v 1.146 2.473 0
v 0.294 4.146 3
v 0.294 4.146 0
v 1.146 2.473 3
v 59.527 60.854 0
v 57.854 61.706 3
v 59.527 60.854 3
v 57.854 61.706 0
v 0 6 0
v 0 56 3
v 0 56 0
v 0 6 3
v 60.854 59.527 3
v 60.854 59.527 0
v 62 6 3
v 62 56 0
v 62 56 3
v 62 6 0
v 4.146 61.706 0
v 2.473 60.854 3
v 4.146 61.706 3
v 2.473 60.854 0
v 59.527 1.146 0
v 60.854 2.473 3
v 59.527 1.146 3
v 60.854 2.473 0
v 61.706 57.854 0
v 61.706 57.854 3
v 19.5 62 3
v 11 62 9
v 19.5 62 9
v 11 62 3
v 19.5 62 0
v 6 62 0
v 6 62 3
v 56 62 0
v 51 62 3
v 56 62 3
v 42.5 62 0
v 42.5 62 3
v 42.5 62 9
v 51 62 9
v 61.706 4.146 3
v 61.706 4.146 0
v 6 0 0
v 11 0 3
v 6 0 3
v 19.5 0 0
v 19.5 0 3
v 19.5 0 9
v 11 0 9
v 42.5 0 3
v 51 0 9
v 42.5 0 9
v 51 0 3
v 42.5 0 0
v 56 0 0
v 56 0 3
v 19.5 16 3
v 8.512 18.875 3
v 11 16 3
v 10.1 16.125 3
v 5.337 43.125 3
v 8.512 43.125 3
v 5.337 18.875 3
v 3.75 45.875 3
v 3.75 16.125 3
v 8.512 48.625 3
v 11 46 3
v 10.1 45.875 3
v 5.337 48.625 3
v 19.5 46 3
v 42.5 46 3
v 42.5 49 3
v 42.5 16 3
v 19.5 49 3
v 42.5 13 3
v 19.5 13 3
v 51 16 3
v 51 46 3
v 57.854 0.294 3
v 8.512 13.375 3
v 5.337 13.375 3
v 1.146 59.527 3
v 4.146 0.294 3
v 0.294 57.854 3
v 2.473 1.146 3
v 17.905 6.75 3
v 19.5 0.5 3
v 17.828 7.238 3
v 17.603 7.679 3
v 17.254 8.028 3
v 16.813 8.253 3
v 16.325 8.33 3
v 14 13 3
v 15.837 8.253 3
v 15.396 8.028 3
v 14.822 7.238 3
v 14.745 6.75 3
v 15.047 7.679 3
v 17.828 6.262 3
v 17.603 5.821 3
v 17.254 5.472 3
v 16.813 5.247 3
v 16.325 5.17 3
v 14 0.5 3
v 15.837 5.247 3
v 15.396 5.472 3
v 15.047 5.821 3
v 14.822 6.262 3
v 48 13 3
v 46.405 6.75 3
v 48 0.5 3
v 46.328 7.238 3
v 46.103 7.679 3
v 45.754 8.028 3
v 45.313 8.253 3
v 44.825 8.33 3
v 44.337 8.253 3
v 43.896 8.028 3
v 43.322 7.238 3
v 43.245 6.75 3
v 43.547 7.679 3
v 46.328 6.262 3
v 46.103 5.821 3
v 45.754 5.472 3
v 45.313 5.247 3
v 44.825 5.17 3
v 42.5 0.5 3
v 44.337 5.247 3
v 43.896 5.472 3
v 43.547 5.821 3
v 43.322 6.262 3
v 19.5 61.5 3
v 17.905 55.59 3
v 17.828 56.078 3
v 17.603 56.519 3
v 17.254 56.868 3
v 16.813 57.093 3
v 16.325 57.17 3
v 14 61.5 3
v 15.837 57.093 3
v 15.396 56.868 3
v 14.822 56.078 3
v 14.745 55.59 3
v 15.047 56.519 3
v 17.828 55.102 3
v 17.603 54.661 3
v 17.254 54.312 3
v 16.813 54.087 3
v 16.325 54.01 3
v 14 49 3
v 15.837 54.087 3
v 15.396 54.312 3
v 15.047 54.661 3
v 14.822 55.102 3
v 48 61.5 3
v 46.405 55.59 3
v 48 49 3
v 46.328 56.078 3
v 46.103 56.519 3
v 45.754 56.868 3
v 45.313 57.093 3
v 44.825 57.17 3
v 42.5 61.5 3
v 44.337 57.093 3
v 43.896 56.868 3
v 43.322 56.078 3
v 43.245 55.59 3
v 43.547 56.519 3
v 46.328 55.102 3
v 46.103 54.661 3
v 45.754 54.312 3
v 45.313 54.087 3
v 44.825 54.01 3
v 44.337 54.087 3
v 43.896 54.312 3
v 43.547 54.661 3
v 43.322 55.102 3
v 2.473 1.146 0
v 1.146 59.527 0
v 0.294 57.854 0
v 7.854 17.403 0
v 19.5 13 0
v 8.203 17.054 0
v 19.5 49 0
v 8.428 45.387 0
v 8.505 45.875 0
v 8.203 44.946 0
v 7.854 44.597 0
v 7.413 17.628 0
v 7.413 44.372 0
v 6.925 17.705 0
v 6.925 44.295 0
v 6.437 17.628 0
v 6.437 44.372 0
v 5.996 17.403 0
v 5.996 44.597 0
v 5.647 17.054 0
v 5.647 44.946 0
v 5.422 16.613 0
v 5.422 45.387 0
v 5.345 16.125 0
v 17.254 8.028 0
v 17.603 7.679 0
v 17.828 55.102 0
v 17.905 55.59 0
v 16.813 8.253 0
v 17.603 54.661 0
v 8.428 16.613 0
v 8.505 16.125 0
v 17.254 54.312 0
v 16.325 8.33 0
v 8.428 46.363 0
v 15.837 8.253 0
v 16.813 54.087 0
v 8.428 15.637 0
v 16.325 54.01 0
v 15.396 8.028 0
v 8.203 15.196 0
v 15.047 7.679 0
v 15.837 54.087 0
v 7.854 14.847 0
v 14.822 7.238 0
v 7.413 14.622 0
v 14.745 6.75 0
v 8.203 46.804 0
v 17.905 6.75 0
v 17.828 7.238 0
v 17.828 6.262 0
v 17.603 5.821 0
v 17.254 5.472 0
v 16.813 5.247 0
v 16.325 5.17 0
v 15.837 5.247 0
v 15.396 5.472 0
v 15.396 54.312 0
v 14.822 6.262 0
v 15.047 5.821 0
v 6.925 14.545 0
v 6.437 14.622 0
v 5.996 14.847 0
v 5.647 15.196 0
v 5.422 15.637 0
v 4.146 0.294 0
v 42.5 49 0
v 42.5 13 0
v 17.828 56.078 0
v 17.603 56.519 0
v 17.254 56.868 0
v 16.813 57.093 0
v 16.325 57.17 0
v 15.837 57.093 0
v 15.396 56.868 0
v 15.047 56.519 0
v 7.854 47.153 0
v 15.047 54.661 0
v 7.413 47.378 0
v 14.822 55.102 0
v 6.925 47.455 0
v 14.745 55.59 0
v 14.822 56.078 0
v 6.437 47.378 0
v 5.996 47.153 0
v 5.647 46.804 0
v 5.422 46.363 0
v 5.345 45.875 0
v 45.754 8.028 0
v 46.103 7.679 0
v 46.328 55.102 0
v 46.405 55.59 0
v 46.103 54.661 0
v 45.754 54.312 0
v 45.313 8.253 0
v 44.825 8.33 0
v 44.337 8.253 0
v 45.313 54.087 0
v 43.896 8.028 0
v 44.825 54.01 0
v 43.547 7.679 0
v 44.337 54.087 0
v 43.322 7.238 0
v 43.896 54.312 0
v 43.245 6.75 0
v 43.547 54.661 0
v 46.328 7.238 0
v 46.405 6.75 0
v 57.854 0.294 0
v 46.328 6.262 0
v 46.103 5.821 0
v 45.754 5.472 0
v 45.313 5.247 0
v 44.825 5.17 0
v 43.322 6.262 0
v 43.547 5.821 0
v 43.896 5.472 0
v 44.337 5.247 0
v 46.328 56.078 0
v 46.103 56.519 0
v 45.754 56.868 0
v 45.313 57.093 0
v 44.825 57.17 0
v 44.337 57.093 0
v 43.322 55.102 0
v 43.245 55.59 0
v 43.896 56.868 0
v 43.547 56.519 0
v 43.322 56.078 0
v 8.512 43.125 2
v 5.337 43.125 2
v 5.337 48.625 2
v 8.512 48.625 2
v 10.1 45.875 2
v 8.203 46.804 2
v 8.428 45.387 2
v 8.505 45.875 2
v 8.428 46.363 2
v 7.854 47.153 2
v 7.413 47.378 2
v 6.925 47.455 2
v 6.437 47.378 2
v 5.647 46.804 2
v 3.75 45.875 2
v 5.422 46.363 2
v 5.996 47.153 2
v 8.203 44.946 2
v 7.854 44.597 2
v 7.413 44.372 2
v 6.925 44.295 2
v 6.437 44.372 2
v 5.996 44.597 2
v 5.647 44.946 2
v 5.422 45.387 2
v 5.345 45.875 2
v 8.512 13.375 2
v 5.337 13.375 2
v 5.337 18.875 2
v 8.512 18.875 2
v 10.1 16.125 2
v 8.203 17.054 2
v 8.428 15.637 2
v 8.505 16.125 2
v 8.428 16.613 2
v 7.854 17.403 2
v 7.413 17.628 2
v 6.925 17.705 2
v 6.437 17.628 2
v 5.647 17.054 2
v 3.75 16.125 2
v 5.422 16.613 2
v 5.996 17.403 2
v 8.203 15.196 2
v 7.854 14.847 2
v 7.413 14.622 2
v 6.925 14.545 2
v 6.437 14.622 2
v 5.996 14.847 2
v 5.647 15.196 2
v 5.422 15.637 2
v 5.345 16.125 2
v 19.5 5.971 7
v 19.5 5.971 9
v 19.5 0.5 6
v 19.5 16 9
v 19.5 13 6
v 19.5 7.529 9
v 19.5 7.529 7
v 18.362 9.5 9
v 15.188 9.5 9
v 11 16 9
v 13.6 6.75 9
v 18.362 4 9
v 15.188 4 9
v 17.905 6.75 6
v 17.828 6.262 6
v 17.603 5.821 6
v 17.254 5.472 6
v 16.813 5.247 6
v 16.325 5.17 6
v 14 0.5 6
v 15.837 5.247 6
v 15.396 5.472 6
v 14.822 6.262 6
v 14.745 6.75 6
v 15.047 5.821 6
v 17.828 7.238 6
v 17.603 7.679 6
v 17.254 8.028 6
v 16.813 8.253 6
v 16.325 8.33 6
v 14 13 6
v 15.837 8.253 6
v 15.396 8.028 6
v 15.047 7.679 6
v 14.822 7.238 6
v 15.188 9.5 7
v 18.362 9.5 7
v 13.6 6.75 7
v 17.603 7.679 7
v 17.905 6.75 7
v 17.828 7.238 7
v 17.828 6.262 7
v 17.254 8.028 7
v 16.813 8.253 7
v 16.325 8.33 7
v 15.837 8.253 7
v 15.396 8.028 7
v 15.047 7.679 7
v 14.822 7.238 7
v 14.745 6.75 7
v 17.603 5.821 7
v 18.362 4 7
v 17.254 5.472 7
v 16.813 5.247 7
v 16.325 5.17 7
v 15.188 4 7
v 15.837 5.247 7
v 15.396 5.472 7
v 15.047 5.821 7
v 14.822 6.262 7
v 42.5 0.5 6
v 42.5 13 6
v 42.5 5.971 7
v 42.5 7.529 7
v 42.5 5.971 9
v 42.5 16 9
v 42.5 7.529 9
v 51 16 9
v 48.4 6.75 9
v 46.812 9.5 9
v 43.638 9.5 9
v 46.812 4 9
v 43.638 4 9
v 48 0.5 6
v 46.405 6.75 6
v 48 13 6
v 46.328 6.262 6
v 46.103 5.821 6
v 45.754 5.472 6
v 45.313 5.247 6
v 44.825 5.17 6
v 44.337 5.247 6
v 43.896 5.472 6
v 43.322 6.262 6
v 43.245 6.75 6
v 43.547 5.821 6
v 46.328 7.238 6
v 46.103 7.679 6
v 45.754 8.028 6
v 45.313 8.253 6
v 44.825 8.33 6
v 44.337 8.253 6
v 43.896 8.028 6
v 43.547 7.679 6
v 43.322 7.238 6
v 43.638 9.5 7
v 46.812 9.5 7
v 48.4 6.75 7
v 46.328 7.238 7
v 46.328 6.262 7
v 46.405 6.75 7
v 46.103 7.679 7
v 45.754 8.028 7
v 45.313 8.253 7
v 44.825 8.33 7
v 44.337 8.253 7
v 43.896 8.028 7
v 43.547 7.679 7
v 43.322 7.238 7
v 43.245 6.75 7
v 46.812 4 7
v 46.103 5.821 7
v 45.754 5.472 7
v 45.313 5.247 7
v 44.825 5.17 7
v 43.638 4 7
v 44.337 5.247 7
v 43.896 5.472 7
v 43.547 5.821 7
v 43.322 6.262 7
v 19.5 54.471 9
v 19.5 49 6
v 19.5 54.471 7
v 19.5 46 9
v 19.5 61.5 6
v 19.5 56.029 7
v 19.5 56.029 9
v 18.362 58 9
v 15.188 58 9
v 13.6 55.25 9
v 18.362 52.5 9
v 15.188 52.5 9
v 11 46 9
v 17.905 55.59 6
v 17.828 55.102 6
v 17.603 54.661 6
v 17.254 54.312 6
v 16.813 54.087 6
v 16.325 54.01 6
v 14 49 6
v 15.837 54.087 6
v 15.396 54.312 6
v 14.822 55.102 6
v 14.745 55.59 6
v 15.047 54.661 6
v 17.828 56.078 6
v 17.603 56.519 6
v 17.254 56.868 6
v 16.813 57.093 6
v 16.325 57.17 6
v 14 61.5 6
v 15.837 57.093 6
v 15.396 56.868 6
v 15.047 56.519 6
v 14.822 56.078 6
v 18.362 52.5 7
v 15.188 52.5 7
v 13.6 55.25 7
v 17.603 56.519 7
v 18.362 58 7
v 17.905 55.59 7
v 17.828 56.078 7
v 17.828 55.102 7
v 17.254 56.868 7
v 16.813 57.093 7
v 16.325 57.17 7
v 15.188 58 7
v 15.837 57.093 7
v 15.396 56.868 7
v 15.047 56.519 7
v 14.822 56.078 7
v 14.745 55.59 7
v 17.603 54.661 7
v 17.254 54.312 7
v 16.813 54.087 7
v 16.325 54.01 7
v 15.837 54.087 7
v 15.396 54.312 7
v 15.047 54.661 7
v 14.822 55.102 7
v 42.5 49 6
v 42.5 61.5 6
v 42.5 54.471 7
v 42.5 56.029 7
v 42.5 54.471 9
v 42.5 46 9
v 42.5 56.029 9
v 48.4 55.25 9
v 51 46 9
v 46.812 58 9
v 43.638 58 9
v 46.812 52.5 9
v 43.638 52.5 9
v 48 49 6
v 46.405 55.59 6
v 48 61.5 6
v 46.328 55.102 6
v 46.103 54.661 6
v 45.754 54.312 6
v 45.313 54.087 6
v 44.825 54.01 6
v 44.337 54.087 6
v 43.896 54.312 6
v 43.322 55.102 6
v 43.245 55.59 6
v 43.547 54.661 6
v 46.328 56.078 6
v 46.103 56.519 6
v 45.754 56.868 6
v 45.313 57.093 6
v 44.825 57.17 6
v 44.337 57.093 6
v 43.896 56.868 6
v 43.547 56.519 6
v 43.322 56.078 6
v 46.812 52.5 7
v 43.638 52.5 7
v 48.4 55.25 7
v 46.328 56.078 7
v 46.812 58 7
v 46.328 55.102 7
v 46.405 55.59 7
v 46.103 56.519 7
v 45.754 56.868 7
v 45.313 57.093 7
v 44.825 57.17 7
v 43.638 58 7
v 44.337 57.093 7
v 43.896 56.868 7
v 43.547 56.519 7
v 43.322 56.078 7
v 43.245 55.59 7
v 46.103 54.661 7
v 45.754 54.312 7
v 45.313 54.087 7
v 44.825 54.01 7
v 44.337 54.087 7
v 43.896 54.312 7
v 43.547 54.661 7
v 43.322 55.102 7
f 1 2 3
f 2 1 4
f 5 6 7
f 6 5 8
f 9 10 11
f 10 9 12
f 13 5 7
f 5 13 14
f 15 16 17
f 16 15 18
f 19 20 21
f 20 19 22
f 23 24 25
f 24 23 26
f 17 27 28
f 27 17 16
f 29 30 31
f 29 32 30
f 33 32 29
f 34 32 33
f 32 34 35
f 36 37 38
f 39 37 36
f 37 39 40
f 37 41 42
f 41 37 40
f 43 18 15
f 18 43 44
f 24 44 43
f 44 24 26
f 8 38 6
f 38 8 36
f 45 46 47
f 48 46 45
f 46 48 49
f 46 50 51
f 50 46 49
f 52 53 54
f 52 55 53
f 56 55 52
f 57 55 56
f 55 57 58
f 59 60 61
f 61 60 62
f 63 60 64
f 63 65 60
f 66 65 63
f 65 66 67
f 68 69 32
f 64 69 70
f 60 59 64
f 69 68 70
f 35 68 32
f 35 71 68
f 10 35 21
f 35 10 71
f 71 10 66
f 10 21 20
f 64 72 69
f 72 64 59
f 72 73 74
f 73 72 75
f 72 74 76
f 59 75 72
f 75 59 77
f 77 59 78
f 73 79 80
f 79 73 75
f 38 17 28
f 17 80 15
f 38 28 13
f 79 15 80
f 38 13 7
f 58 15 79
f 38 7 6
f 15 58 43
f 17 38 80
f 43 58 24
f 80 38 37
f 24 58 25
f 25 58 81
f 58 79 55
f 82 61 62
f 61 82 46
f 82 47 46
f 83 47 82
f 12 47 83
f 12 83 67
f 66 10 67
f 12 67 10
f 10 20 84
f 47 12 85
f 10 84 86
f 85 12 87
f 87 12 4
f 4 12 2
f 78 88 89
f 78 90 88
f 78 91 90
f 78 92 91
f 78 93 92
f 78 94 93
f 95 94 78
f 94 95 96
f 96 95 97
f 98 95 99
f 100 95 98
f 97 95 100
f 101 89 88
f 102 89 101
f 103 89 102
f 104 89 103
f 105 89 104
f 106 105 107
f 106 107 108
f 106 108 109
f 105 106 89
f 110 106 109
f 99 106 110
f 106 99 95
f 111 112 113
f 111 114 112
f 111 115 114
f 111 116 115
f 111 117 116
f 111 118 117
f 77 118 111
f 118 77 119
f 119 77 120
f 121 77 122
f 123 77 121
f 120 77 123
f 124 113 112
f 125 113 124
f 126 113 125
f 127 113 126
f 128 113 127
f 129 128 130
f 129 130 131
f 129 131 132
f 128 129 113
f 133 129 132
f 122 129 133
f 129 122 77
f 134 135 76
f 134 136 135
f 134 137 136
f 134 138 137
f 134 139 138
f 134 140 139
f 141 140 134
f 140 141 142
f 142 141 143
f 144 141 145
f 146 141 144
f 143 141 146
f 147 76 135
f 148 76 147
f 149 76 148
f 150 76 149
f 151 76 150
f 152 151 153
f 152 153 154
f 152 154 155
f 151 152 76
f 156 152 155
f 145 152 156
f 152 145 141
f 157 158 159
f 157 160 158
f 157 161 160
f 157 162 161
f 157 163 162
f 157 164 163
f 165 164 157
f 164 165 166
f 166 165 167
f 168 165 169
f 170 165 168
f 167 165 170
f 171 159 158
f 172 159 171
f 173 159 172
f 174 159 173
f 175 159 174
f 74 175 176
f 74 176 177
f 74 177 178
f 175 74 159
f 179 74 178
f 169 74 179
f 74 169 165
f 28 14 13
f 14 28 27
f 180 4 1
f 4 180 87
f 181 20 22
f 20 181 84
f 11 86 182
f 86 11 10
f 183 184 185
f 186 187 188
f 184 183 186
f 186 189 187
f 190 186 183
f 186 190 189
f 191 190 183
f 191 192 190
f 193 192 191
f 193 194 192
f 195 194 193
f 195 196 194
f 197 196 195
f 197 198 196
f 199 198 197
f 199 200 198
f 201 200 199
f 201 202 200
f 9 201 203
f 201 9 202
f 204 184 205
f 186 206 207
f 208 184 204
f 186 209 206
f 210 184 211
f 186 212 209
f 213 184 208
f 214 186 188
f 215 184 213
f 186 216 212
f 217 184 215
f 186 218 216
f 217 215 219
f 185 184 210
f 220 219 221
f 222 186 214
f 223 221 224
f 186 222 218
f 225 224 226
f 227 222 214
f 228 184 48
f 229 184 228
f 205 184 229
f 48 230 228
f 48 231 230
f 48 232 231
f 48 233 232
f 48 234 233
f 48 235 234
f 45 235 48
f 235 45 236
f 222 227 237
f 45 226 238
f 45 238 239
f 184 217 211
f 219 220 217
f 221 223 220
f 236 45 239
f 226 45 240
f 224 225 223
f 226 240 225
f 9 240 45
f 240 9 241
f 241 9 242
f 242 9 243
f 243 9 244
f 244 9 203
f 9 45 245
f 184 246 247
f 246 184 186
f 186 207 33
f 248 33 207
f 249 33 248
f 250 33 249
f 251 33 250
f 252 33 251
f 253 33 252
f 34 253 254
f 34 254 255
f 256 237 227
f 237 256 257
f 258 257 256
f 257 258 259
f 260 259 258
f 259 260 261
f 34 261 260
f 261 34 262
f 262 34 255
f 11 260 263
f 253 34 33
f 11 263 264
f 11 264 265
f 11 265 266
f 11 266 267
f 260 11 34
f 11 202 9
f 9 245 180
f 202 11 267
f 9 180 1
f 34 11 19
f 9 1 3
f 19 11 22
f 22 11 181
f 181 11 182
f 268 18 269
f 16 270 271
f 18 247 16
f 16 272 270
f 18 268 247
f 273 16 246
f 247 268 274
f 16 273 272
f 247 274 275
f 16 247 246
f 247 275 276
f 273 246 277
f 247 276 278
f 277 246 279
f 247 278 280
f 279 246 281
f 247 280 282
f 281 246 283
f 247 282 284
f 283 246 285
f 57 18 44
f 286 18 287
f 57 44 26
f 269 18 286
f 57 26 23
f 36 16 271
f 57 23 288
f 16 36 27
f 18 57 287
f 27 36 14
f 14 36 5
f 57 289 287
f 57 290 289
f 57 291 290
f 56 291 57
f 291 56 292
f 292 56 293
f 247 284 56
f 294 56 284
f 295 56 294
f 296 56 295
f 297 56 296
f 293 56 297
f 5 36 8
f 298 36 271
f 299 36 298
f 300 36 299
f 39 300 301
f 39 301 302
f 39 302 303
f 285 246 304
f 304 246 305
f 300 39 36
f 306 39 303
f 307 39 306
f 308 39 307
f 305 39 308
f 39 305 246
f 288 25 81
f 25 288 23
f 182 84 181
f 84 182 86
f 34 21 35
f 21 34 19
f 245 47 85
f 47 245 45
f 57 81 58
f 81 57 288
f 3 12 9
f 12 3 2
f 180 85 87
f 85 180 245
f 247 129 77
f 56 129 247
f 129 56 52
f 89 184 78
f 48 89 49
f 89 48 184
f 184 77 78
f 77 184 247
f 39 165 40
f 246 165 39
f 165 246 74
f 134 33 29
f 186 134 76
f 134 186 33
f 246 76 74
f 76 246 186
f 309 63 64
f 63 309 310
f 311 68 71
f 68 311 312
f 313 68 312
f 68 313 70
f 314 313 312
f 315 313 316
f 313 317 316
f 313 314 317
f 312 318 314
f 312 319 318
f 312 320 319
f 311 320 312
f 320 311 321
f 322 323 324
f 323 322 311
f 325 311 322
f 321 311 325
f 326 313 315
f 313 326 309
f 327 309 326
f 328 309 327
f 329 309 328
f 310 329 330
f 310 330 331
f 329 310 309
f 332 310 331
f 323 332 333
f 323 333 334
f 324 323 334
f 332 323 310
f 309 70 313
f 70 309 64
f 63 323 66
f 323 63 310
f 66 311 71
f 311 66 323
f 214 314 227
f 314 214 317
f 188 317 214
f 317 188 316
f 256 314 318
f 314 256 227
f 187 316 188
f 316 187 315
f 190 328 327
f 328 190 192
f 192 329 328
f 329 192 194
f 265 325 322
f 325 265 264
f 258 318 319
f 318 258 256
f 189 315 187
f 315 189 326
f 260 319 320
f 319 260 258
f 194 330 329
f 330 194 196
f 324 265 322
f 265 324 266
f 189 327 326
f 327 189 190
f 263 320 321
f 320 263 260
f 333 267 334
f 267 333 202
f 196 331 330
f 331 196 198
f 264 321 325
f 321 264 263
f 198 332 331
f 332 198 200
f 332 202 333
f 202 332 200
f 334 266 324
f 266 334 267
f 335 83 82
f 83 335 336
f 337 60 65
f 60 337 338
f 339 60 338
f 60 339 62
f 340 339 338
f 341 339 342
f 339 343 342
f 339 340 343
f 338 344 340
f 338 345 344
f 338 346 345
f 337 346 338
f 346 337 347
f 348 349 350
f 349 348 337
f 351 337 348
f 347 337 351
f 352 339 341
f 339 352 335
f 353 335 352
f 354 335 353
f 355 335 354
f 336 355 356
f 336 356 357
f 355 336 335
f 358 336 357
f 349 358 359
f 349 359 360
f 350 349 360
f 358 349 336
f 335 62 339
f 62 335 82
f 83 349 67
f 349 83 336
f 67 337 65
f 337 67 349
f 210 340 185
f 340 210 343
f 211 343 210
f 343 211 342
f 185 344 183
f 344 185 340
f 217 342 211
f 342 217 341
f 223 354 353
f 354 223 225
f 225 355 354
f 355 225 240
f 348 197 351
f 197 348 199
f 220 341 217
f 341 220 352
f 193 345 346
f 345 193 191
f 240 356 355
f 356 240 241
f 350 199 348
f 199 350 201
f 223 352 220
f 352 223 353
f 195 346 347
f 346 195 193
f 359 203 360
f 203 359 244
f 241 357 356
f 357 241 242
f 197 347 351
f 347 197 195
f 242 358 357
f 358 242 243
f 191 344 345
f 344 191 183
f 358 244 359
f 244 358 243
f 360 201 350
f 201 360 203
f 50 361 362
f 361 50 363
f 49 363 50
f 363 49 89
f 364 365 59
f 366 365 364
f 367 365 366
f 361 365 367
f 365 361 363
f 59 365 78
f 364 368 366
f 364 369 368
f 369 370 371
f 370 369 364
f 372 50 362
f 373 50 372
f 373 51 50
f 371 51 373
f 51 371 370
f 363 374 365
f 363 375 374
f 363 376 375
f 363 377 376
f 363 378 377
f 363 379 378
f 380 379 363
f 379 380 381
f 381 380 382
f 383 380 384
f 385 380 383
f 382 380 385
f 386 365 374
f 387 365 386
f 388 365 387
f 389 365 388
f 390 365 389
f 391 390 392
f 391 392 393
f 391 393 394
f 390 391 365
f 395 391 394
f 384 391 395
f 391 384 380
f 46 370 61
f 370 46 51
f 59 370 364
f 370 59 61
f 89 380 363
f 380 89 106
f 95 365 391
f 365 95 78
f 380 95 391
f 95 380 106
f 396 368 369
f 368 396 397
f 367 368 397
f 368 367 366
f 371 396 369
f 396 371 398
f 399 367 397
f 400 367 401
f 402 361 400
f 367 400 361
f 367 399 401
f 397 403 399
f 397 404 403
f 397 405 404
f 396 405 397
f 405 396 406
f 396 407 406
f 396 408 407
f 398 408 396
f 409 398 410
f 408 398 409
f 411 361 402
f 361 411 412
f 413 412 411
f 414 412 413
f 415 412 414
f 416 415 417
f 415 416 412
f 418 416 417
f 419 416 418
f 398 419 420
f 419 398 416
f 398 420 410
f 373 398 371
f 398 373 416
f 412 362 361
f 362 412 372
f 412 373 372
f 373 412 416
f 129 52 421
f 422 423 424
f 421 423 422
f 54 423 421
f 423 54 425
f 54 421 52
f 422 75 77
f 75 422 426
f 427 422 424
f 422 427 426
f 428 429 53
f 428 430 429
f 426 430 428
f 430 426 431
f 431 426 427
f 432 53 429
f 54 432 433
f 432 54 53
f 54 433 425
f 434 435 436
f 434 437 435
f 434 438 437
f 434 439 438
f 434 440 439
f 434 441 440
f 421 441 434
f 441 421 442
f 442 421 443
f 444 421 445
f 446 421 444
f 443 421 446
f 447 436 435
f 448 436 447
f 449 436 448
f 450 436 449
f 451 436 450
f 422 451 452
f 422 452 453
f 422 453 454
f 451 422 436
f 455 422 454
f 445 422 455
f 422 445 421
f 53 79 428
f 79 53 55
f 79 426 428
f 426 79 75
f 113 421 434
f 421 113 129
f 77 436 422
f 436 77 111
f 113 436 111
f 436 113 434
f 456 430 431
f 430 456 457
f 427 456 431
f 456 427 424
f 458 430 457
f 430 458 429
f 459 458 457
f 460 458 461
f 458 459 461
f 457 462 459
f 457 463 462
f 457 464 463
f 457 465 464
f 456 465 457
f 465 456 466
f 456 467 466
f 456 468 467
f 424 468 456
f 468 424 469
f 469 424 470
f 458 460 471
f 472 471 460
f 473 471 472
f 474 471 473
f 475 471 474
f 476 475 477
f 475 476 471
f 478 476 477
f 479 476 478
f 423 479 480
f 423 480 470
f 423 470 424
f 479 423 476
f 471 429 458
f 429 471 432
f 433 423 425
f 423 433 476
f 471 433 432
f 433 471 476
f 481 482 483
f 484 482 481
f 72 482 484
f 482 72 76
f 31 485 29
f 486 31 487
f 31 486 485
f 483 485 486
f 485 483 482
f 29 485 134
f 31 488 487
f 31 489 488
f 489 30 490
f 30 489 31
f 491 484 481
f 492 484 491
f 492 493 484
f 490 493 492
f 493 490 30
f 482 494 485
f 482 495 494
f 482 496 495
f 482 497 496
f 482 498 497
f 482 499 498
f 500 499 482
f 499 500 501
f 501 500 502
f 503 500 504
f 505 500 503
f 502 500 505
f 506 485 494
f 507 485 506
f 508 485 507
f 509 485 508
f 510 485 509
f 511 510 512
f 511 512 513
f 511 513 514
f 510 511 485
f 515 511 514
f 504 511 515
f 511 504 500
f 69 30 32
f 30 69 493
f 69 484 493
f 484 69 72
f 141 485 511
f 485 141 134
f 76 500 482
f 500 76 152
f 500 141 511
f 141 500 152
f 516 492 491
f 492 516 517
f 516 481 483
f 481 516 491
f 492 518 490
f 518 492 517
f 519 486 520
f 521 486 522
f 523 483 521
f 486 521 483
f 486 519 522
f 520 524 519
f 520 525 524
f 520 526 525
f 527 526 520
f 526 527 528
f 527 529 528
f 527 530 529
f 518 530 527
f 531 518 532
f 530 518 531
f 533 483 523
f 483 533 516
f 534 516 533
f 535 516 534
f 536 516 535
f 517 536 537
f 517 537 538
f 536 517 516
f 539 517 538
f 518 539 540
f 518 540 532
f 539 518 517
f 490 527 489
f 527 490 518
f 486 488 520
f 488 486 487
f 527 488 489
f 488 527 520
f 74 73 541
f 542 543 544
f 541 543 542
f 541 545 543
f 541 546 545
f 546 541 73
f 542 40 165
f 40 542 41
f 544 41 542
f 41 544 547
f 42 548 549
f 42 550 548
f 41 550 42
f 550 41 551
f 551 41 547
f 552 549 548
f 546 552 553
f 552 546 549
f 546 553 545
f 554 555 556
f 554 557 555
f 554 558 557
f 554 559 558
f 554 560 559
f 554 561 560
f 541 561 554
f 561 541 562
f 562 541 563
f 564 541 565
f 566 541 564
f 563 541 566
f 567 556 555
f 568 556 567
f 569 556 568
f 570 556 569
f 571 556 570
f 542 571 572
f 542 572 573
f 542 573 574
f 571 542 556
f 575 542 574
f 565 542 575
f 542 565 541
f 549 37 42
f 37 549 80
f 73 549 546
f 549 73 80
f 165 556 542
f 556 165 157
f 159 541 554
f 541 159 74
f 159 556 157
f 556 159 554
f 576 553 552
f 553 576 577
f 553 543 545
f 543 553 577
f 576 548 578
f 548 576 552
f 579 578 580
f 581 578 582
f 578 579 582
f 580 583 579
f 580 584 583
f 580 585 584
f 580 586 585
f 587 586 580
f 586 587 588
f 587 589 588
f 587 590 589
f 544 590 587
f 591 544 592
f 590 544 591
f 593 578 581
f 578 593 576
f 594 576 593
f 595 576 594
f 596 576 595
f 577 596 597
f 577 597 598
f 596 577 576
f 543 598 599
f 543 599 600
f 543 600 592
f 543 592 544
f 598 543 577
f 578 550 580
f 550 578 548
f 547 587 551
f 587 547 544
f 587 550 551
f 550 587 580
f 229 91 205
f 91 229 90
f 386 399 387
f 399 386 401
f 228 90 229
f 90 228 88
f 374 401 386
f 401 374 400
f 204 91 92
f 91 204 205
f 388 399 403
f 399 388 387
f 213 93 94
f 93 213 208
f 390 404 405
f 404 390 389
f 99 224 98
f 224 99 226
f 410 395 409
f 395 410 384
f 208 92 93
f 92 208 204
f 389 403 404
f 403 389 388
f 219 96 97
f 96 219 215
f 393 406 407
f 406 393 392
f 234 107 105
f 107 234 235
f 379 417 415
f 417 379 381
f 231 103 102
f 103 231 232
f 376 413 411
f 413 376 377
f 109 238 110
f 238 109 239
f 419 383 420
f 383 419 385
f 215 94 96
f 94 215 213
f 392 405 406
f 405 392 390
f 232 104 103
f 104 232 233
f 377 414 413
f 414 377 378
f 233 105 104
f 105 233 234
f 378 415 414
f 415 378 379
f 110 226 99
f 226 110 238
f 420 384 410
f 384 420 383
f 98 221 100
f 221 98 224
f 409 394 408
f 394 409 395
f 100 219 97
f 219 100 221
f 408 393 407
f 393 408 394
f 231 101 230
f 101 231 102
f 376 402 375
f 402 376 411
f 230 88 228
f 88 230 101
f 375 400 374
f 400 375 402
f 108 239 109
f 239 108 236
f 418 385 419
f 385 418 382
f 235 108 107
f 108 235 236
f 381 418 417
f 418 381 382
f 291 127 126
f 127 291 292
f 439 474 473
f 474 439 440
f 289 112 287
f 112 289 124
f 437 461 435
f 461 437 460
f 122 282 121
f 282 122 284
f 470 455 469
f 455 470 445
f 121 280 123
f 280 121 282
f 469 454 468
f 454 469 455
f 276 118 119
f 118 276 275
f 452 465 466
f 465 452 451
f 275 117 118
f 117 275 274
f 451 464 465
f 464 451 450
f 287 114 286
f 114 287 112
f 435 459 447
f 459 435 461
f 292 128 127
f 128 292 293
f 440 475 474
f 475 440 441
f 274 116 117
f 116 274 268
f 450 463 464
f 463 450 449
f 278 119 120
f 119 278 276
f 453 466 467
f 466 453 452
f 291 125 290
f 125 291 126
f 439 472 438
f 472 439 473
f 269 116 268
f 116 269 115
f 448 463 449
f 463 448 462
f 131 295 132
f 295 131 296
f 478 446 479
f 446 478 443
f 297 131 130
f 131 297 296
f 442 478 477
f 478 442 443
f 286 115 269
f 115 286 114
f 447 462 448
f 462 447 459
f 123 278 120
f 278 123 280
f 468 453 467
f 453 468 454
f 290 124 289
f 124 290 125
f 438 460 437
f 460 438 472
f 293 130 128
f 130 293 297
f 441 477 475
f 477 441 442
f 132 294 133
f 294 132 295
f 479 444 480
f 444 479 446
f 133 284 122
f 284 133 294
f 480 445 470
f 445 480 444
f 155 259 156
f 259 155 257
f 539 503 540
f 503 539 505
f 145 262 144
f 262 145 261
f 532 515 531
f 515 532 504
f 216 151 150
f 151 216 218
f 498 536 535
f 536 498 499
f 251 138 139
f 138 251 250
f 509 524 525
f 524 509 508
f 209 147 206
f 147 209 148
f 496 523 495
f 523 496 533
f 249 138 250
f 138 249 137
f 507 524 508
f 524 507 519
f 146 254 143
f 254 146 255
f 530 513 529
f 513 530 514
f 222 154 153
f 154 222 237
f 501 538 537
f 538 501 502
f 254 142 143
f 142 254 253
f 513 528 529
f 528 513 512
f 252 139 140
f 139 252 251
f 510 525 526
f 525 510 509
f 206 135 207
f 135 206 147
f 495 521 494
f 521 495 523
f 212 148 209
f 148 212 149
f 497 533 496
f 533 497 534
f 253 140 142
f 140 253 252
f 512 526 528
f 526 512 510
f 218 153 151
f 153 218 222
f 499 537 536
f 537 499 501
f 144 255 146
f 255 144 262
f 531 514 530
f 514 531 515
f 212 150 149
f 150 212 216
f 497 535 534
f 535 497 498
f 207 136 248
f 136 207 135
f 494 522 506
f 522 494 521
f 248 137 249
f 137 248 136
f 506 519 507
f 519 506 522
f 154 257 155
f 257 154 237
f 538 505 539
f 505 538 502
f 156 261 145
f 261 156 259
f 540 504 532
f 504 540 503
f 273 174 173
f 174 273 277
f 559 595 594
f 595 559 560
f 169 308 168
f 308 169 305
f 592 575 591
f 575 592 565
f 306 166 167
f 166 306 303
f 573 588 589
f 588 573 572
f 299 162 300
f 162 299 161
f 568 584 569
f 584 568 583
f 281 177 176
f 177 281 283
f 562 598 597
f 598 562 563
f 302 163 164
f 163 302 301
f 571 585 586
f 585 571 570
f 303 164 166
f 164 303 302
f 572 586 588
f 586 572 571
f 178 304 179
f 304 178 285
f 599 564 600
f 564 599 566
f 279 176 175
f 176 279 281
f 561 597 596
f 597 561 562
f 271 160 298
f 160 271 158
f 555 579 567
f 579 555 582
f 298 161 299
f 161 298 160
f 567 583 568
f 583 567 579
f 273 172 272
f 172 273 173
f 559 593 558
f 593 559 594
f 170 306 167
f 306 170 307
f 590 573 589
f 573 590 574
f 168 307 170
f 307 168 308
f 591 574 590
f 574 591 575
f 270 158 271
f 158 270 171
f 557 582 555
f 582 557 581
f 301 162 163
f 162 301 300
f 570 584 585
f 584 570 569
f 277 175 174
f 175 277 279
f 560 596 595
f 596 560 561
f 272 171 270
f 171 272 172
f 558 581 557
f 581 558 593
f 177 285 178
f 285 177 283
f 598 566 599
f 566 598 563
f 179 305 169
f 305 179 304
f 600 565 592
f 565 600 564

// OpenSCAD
//Biped_Platform_v2

//variables
xyPlatform = 62;
zPlatform = 3;
cornerRadius = 6;

xRectangularHole = 23;
yRectangularHole = 13;
zRectangularHole = zPlatform+1;

screwHeadD = 6.35;
xScrewDistance = 3.75;
yScrewDistance = 12.95;
screwRoundedHeadD = 3.16;

//upperBox
xTopUpperBox = 8.5;
yTopUpperBox = 16;
zTopUpperBox = 3;

xLeftSideUpperBox = 8.5;
yLeftSideUpperBox = 0.5;
zLeftSideUpperBox = 3;

xRightSideUpperBox = 8.5;
yRightSideUpperBox = 3;
zRightSideUpperBox = 3;

xBackUpperBox = 3;
yBackUpperBox = 12.5;
zBackUpperBox = 3;



//modules
module bipedPlatform(){
    difference(){
        union(){
            holedPlatform();
            translate([xyPlatform/2-xRectangularHole/2-xLeftSideUpperBox,0,zPlatform])
                    upperBoxes();
        }
        translate([xyPlatform/2-xRectangularHole/2-screwHeadD/2,yLeftSideUpperBox+yBackUpperBox/2,0])
        bigHoles();      
    }       
}

module bigHole(){
    altura=zPlatform+zLeftSideUpperBox+zTopUpperBox+2;
    translate([0,0,altura/2-1])
        cylinder(h=altura, d=screwRoundedHeadD, center=true, $fn=20);
}

module bigHoles(){
    union(){
        bigHole();
        translate([28.5,0,0])
        mirror()
            bigHole();
        translate([0,xyPlatform-(4.5+yLeftSideUpperBox)*2-screwRoundedHeadD,0])
        mirror()
            bigHole();
        translate([28.5,xyPlatform-(4.5+yLeftSideUpperBox)*2-screwRoundedHeadD,0])
        mirror()
            bigHole();
    }    
}

module platform(){
    translate([cornerRadius,cornerRadius,0])
        hull(){        
            cylinder(h=zPlatform,d=cornerRadius*2, $fn=20);
            translate([xyPlatform-cornerRadius*2,0,0])
                cylinder(h=zPlatform,d=cornerRadius*2, $fn=20);
            translate([0,xyPlatform-cornerRadius*2,0])    
                cylinder(h=zPlatform,d=cornerRadius*2, $fn=20);
            translate([xyPlatform-cornerRadius*2,xyPlatform-cornerRadius*2,0])    
                cylinder(h=zPlatform,d=cornerRadius*2, $fn=20);
        }
}

module holedPlatform(){
    difference(){
        platform();
        //rectangulos
        translate([xyPlatform/2-xRectangularHole/2, 0, 0])
            cube([xRectangularHole,yRectangularHole,zRectangularHole]);
        translate([xyPlatform/2-xRectangularHole/2, xyPlatform-yRectangularHole, 0])
            cube([xRectangularHole,yRectangularHole,zRectangularHole]);
        
        //tornillos dcha
        translate([xScrewDistance+screwHeadD/2, xyPlatform-yScrewDistance-screwHeadD/2, zPlatform])
            cylinder(h=(zPlatform+1)/2,d=screwHeadD, center=true, $fn=6);
        translate([xScrewDistance+screwHeadD/2, xyPlatform-yScrewDistance-screwHeadD/2, 0])
            cylinder(h=zPlatform+1,d=screwRoundedHeadD, center=true, $fn=20);
        
        //tornillos izdq
        translate([xScrewDistance+screwHeadD/2, yScrewDistance+screwHeadD/2, zPlatform])
            cylinder(h=(zPlatform+1)/2,d=screwHeadD, center=true, $fn=6);
        translate([xScrewDistance+screwHeadD/2, yScrewDistance+screwHeadD/2, 0])
            cylinder(h=zPlatform+1,d=screwRoundedHeadD, center=true, $fn=20);
        }        
    }
    
module upperBox(){
    difference(){
        union(){
            translate([0,0,zLeftSideUpperBox])
                cube([xTopUpperBox, yTopUpperBox, zTopUpperBox]);
            cube([xLeftSideUpperBox, yLeftSideUpperBox, zLeftSideUpperBox]);
            translate([0,yTopUpperBox-yRightSideUpperBox,0])
                cube([xRightSideUpperBox, yRightSideUpperBox, zRightSideUpperBox]);
            translate([0,yLeftSideUpperBox,0])
                cube([xBackUpperBox, yBackUpperBox, zBackUpperBox]);   
        }
        translate([2.6+screwHeadD/2, yLeftSideUpperBox+yBackUpperBox/2, (zTopUpperBox+1)/2+zLeftSideUpperBox])
            cylinder(h=(zPlatform+1)/2,d=screwHeadD, center=true, $fn=6);    
    }    
}

module upperSideBoxes(){
    union(){
        upperBox();
        translate([xLeftSideUpperBox*2+xRectangularHole,0,0])
            mirror([1,0,0]){
                upperBox();
            }
    }
}

module upperBoxes(){
    union(){
        upperSideBoxes();
        translate([0,xyPlatform,0])
            rotate([0,0,180])
                mirror([1,0,0]){
                    upperSideBoxes();
                }
        }
}
    
//invocation
bipedPlatform();
